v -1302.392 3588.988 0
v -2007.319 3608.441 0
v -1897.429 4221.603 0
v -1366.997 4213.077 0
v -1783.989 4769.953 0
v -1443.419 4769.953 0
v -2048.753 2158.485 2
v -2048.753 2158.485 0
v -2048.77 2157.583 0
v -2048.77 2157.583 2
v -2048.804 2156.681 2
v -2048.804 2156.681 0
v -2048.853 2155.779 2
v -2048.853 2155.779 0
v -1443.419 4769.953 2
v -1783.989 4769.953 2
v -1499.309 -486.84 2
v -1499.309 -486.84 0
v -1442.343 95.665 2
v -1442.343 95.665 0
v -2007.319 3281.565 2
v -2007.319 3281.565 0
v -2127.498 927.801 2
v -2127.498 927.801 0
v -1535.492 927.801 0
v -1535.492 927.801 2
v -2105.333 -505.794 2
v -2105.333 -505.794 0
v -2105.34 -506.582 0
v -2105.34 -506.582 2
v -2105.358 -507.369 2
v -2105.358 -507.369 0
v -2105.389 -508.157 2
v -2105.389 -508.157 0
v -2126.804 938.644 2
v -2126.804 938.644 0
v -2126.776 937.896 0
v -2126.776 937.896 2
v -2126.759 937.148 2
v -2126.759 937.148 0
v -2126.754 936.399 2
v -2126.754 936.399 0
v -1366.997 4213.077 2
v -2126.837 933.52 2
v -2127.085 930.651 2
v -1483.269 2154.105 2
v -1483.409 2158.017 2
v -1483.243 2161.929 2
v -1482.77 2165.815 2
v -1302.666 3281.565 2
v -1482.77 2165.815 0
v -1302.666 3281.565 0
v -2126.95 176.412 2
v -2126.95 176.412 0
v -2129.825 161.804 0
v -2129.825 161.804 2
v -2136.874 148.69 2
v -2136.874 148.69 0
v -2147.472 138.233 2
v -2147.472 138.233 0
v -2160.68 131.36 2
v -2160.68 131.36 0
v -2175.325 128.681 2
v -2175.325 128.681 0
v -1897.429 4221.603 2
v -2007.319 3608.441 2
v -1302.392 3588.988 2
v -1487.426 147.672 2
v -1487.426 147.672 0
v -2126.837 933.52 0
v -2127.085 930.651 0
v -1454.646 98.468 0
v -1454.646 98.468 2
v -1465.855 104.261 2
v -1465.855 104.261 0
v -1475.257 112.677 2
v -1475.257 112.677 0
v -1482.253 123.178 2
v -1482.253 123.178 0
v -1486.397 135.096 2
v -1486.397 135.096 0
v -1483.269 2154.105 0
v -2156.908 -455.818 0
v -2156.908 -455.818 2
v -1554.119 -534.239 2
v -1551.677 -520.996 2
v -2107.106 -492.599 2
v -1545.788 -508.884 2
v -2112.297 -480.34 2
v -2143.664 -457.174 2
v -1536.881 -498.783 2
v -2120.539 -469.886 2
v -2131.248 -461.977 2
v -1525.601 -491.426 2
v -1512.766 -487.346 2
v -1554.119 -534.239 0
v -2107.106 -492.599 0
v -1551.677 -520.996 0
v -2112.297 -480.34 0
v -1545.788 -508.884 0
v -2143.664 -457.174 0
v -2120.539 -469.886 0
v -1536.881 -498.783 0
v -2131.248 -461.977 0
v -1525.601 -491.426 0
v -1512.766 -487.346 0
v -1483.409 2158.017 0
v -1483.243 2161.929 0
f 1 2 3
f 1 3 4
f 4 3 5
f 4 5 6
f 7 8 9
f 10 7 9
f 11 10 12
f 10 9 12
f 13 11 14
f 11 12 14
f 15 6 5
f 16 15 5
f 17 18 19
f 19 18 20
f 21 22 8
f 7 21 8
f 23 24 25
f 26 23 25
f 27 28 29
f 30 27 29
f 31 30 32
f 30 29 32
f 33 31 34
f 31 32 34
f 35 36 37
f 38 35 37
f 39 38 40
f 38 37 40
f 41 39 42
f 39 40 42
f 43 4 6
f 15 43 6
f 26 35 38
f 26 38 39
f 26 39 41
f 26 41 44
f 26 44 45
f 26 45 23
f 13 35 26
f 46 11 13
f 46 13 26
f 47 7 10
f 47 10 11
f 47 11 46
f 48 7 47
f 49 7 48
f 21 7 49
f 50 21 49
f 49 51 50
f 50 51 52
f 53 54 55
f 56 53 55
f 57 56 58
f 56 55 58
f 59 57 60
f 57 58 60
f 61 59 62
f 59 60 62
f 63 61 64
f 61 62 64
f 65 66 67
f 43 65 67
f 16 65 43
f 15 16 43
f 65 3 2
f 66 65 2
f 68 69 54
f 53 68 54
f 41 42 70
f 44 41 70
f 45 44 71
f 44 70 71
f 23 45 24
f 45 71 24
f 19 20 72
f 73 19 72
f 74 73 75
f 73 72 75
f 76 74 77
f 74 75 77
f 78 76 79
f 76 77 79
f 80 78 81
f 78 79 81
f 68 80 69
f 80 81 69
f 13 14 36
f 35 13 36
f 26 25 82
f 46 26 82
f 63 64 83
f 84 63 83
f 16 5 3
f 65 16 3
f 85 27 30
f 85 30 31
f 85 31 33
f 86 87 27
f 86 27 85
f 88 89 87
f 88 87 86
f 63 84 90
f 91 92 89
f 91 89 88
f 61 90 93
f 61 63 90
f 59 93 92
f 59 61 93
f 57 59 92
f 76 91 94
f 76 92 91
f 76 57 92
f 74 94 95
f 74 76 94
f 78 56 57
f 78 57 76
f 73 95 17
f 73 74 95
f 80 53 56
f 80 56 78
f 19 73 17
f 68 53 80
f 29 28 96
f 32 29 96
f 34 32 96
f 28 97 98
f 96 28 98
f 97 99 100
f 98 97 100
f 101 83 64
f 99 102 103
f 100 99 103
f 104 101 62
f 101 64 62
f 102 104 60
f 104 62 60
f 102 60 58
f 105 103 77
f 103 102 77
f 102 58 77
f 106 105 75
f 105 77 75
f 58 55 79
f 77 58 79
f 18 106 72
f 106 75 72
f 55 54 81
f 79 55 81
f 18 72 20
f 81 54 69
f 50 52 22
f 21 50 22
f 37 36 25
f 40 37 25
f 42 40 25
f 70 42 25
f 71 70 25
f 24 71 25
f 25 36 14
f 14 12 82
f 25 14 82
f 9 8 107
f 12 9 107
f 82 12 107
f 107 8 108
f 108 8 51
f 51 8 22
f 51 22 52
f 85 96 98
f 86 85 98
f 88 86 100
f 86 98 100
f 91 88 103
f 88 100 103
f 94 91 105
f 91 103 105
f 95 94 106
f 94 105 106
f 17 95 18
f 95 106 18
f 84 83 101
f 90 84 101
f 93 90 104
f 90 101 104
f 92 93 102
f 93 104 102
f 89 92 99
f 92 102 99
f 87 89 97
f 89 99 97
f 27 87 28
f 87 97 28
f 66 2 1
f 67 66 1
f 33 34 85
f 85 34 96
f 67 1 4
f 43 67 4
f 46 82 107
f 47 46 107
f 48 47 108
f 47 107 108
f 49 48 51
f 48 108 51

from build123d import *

# Parameters (mm, degrees)
F3_DEPTH = 2
F4_DEPTH = 2
F5_DEPTH = 2


with BuildPart() as f3:
    # F2 (on face) → F3 (new body)
    with BuildSketch(Plane.XY):
        Polygon((-1443.4191744163, 4769.9527426873), (-1783.9887283179, 4769.9527426873), (-1897.4294909214, 4221.6033277621), (-2007.3191407106, 3608.4414445777), (-1302.3924530881, 3588.9879399751), (-1366.9970424155, 4213.0771913099), align=None)
    extrude(amount=F3_DEPTH)


with BuildPart() as f4:
    # F2 (on face) → F4 (new body)
    with BuildSketch(Plane.XY):
        with BuildLine():
            Line((-1482.7704714546, 2165.8153709844), (-1302.6659156704, 3281.5647125244))
            Line((-1302.6659156704, 3281.5647125244), (-2007.3191407106, 3281.5647125244))
            Line((-2007.3191407106, 3281.5647125244), (-2048.7534404071, 2158.4850639998))
            ThreePointArc((-2048.7534404071, 2158.4850639998), (-2048.7850346679, 2157.1314588818), (-2048.8532689015, 2155.7792055394))
            Line((-2048.8532689015, 2155.7792055394), (-2126.8039729209, 938.6436782907))
            ThreePointArc((-2126.8039729209, 938.6436782907), (-2126.7661725299, 937.5217175422), (-2126.753570282, 936.3991909393))
            ThreePointArc((-2126.753570282, 936.3991909393), (-2126.9401190402, 932.0840924022), (-2127.4983732973, 927.8011929161))
            Line((-2127.4983732973, 927.8011929161), (-1535.4920138724, 927.8011929161))
            Line((-1535.4920138724, 927.8011929161), (-1483.2691643821, 2154.1049982133))
            ThreePointArc((-1483.2691643821, 2154.1049982133), (-1483.3641474246, 2159.974848068), (-1482.7704714546, 2165.8153709844))
        make_face()
    extrude(amount=F4_DEPTH)


with BuildPart() as f5:
    # F2 (on face) → F5 (new body)
    with BuildSketch(Plane.XY):
        with BuildLine():
            ThreePointArc((-2126.9499036673, 176.4117163662), (-2141.7820128861, 143.064794042), (-2175.3248371078, 128.6812049348))
            Line((-2175.3248371078, 128.6812049348), (-2156.9079972429, -455.8184208223))
            ThreePointArc((-2156.9079972429, -455.8184208223), (-2120.5391814878, -469.8858711882), (-2105.3333422956, -505.7936192891))
            ThreePointArc((-2105.3333422956, -505.7936192891), (-2105.3473121727, -506.9754790747), (-2105.3892139977, -508.1566784428))
            Line((-2105.3892139977, -508.1566784428), (-1554.1191952458, -534.2394975518))
            ThreePointArc((-1554.1191952458, -534.2394975518), (-1536.8809883486, -498.7829492864), (-1499.3085604422, -486.8399491127))
            Line((-1499.3085604422, -486.8399491127), (-1442.3428307094, 95.664821314))
            ThreePointArc((-1442.3428307094, 95.664821314), (-1475.2571492143, 112.6767149982), (-1487.4259125915, 147.6721159422))
            Line((-1487.4259125915, 147.6721159422), (-2126.9499036673, 176.4117163662))
        make_face()
    extrude(amount=F5_DEPTH)


solid = Compound([f3.part, f4.part, f5.part])
